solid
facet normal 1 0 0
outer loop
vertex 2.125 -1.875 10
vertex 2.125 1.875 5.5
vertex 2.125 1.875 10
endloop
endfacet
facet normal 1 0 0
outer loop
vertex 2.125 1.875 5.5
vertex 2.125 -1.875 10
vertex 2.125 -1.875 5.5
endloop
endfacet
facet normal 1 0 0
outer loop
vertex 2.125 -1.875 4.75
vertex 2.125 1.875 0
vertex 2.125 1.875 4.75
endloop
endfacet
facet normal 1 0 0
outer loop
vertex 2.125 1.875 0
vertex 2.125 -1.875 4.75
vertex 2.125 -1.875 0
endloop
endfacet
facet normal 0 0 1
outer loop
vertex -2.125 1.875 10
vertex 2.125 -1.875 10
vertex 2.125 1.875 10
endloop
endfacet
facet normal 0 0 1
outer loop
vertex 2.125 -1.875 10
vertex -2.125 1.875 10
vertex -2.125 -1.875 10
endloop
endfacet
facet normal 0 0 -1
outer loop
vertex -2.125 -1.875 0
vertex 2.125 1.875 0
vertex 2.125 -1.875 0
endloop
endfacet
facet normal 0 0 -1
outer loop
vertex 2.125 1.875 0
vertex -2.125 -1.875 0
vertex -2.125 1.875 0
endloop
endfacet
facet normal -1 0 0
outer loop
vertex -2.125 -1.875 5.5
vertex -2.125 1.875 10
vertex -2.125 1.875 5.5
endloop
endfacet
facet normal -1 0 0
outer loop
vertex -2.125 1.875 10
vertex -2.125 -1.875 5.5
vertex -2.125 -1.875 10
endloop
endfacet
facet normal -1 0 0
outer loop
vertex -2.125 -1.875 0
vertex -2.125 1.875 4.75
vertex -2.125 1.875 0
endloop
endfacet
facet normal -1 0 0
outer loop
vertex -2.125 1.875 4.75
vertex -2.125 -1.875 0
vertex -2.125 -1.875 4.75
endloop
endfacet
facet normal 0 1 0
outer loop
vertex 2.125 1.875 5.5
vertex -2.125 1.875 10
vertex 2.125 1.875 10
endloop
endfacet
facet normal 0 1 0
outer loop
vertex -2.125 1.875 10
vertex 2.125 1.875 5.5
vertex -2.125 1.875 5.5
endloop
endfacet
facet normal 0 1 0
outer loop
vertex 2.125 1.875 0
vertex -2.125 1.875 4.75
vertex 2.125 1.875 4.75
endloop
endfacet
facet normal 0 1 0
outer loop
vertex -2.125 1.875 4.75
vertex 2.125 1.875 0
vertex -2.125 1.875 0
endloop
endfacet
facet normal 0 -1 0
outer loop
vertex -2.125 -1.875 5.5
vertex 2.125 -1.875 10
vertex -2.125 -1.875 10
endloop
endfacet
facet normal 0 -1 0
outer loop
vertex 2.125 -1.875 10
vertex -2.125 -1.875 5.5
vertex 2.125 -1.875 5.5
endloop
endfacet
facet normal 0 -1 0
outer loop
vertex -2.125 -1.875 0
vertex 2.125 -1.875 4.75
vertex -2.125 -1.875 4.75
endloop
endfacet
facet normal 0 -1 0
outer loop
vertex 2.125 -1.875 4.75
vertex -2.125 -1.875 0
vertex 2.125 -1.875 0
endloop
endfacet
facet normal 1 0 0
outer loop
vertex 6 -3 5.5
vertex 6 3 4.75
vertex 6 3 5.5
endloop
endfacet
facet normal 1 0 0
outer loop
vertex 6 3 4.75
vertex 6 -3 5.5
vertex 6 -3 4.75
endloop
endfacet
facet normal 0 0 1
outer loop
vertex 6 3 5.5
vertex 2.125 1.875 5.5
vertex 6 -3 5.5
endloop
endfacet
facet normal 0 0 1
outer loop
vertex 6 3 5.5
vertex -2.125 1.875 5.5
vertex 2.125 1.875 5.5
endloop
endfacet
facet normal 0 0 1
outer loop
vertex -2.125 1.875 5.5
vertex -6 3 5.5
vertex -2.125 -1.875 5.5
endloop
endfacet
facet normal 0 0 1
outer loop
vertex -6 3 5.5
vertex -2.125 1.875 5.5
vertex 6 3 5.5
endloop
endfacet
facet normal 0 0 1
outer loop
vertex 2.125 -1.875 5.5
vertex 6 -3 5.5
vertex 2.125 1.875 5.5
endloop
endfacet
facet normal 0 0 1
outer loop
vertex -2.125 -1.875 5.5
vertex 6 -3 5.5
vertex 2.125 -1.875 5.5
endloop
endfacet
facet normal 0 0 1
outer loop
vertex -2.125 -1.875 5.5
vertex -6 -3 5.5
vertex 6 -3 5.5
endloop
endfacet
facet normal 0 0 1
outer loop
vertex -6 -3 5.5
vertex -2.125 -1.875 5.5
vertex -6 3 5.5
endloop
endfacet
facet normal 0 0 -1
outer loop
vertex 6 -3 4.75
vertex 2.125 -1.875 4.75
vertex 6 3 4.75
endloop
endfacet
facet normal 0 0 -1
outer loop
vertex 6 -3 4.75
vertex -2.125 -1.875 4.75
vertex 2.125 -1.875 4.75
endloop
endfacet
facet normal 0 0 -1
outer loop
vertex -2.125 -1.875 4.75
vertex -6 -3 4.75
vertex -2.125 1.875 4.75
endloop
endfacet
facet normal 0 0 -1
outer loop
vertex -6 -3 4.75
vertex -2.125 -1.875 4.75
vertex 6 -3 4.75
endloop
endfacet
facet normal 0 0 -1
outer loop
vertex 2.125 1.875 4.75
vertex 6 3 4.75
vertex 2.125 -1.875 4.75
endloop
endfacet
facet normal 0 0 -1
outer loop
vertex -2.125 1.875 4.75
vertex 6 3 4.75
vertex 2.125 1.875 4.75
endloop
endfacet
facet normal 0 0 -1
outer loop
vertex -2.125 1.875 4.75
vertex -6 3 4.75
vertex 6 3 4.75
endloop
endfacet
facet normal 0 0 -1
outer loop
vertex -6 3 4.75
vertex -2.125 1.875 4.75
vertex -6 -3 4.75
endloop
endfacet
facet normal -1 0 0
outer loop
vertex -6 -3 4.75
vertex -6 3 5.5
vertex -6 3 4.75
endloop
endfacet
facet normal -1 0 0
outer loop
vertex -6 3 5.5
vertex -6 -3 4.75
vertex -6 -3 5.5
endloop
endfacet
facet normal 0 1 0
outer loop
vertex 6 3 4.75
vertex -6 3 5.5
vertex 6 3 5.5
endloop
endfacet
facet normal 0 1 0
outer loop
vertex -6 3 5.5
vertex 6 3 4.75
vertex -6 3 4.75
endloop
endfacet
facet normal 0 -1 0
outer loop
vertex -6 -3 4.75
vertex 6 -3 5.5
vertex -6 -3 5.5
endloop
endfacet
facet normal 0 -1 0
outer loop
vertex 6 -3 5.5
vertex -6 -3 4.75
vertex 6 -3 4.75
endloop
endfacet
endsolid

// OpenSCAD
// file: BOSL2/std.scad
// Minimal BOSL2 compatibility shim for bundled gallery models.
// It implements only the helpers used by the imported OpenSCAD projects.

CENTER = [0, 0, 0];
BOTTOM = [0, 0, -1];
TOP = [0, 0, 1];
LEFT = [-1, 0, 0];
RIGHT = [1, 0, 0];
FRONT = [0, -1, 0];
BACK = [0, 1, 0];

module up(z=0) {
    translate([0, 0, z]) children();
}

module down(z=0) {
    translate([0, 0, -z]) children();
}

module attach(anchor=CENTER) {
    children();
}

module cuboid(size=[1, 1, 1], anchor=CENTER) {
    center = anchor == CENTER;
    translate(center ? [0, 0, 0] : [0, 0, size[2] / 2])
        cube(size, center=true);
    children();
}

module xcyl(h=1, r=1, anchor=CENTER) {
    center = anchor == CENTER;
    translate(center ? [0, 0, 0] : [h / 2, 0, 0])
        rotate([0, 90, 0])
            cylinder(h=h, r=r, center=true);
}
// main file
cap_size=[4.25, 3.75];
cap_r=0.7;
cap_l=10;

sw_size=[3.15, 2.65];
sw_l=5;

brim_size=[12, 6, 0.75];
brim_pos_y=5.25;

ol=0.01;

include <BOSL2/std.scad>

difference() {
    union() {
	cuboid(
	    [cap_size[0], cap_size[1], cap_l],
	    anchor=BOTTOM,
	    rounding=cap_r,
	    except=TOP,
	    $fn=40*cap_r
	);
	up(cap_l-brim_pos_y)
	    cuboid(
		brim_size,
		anchor=TOP,
		rounding=cap_r,
		edges="Z",
		$fn=40*cap_r
	    );
    }
    up(cap_l+ol)
	cuboid(
	    [sw_size[0], sw_size[1], sw_l+ol],
	    chamfer=-0.2,
	    edges=TOP,
	    anchor=TOP
	);
}
